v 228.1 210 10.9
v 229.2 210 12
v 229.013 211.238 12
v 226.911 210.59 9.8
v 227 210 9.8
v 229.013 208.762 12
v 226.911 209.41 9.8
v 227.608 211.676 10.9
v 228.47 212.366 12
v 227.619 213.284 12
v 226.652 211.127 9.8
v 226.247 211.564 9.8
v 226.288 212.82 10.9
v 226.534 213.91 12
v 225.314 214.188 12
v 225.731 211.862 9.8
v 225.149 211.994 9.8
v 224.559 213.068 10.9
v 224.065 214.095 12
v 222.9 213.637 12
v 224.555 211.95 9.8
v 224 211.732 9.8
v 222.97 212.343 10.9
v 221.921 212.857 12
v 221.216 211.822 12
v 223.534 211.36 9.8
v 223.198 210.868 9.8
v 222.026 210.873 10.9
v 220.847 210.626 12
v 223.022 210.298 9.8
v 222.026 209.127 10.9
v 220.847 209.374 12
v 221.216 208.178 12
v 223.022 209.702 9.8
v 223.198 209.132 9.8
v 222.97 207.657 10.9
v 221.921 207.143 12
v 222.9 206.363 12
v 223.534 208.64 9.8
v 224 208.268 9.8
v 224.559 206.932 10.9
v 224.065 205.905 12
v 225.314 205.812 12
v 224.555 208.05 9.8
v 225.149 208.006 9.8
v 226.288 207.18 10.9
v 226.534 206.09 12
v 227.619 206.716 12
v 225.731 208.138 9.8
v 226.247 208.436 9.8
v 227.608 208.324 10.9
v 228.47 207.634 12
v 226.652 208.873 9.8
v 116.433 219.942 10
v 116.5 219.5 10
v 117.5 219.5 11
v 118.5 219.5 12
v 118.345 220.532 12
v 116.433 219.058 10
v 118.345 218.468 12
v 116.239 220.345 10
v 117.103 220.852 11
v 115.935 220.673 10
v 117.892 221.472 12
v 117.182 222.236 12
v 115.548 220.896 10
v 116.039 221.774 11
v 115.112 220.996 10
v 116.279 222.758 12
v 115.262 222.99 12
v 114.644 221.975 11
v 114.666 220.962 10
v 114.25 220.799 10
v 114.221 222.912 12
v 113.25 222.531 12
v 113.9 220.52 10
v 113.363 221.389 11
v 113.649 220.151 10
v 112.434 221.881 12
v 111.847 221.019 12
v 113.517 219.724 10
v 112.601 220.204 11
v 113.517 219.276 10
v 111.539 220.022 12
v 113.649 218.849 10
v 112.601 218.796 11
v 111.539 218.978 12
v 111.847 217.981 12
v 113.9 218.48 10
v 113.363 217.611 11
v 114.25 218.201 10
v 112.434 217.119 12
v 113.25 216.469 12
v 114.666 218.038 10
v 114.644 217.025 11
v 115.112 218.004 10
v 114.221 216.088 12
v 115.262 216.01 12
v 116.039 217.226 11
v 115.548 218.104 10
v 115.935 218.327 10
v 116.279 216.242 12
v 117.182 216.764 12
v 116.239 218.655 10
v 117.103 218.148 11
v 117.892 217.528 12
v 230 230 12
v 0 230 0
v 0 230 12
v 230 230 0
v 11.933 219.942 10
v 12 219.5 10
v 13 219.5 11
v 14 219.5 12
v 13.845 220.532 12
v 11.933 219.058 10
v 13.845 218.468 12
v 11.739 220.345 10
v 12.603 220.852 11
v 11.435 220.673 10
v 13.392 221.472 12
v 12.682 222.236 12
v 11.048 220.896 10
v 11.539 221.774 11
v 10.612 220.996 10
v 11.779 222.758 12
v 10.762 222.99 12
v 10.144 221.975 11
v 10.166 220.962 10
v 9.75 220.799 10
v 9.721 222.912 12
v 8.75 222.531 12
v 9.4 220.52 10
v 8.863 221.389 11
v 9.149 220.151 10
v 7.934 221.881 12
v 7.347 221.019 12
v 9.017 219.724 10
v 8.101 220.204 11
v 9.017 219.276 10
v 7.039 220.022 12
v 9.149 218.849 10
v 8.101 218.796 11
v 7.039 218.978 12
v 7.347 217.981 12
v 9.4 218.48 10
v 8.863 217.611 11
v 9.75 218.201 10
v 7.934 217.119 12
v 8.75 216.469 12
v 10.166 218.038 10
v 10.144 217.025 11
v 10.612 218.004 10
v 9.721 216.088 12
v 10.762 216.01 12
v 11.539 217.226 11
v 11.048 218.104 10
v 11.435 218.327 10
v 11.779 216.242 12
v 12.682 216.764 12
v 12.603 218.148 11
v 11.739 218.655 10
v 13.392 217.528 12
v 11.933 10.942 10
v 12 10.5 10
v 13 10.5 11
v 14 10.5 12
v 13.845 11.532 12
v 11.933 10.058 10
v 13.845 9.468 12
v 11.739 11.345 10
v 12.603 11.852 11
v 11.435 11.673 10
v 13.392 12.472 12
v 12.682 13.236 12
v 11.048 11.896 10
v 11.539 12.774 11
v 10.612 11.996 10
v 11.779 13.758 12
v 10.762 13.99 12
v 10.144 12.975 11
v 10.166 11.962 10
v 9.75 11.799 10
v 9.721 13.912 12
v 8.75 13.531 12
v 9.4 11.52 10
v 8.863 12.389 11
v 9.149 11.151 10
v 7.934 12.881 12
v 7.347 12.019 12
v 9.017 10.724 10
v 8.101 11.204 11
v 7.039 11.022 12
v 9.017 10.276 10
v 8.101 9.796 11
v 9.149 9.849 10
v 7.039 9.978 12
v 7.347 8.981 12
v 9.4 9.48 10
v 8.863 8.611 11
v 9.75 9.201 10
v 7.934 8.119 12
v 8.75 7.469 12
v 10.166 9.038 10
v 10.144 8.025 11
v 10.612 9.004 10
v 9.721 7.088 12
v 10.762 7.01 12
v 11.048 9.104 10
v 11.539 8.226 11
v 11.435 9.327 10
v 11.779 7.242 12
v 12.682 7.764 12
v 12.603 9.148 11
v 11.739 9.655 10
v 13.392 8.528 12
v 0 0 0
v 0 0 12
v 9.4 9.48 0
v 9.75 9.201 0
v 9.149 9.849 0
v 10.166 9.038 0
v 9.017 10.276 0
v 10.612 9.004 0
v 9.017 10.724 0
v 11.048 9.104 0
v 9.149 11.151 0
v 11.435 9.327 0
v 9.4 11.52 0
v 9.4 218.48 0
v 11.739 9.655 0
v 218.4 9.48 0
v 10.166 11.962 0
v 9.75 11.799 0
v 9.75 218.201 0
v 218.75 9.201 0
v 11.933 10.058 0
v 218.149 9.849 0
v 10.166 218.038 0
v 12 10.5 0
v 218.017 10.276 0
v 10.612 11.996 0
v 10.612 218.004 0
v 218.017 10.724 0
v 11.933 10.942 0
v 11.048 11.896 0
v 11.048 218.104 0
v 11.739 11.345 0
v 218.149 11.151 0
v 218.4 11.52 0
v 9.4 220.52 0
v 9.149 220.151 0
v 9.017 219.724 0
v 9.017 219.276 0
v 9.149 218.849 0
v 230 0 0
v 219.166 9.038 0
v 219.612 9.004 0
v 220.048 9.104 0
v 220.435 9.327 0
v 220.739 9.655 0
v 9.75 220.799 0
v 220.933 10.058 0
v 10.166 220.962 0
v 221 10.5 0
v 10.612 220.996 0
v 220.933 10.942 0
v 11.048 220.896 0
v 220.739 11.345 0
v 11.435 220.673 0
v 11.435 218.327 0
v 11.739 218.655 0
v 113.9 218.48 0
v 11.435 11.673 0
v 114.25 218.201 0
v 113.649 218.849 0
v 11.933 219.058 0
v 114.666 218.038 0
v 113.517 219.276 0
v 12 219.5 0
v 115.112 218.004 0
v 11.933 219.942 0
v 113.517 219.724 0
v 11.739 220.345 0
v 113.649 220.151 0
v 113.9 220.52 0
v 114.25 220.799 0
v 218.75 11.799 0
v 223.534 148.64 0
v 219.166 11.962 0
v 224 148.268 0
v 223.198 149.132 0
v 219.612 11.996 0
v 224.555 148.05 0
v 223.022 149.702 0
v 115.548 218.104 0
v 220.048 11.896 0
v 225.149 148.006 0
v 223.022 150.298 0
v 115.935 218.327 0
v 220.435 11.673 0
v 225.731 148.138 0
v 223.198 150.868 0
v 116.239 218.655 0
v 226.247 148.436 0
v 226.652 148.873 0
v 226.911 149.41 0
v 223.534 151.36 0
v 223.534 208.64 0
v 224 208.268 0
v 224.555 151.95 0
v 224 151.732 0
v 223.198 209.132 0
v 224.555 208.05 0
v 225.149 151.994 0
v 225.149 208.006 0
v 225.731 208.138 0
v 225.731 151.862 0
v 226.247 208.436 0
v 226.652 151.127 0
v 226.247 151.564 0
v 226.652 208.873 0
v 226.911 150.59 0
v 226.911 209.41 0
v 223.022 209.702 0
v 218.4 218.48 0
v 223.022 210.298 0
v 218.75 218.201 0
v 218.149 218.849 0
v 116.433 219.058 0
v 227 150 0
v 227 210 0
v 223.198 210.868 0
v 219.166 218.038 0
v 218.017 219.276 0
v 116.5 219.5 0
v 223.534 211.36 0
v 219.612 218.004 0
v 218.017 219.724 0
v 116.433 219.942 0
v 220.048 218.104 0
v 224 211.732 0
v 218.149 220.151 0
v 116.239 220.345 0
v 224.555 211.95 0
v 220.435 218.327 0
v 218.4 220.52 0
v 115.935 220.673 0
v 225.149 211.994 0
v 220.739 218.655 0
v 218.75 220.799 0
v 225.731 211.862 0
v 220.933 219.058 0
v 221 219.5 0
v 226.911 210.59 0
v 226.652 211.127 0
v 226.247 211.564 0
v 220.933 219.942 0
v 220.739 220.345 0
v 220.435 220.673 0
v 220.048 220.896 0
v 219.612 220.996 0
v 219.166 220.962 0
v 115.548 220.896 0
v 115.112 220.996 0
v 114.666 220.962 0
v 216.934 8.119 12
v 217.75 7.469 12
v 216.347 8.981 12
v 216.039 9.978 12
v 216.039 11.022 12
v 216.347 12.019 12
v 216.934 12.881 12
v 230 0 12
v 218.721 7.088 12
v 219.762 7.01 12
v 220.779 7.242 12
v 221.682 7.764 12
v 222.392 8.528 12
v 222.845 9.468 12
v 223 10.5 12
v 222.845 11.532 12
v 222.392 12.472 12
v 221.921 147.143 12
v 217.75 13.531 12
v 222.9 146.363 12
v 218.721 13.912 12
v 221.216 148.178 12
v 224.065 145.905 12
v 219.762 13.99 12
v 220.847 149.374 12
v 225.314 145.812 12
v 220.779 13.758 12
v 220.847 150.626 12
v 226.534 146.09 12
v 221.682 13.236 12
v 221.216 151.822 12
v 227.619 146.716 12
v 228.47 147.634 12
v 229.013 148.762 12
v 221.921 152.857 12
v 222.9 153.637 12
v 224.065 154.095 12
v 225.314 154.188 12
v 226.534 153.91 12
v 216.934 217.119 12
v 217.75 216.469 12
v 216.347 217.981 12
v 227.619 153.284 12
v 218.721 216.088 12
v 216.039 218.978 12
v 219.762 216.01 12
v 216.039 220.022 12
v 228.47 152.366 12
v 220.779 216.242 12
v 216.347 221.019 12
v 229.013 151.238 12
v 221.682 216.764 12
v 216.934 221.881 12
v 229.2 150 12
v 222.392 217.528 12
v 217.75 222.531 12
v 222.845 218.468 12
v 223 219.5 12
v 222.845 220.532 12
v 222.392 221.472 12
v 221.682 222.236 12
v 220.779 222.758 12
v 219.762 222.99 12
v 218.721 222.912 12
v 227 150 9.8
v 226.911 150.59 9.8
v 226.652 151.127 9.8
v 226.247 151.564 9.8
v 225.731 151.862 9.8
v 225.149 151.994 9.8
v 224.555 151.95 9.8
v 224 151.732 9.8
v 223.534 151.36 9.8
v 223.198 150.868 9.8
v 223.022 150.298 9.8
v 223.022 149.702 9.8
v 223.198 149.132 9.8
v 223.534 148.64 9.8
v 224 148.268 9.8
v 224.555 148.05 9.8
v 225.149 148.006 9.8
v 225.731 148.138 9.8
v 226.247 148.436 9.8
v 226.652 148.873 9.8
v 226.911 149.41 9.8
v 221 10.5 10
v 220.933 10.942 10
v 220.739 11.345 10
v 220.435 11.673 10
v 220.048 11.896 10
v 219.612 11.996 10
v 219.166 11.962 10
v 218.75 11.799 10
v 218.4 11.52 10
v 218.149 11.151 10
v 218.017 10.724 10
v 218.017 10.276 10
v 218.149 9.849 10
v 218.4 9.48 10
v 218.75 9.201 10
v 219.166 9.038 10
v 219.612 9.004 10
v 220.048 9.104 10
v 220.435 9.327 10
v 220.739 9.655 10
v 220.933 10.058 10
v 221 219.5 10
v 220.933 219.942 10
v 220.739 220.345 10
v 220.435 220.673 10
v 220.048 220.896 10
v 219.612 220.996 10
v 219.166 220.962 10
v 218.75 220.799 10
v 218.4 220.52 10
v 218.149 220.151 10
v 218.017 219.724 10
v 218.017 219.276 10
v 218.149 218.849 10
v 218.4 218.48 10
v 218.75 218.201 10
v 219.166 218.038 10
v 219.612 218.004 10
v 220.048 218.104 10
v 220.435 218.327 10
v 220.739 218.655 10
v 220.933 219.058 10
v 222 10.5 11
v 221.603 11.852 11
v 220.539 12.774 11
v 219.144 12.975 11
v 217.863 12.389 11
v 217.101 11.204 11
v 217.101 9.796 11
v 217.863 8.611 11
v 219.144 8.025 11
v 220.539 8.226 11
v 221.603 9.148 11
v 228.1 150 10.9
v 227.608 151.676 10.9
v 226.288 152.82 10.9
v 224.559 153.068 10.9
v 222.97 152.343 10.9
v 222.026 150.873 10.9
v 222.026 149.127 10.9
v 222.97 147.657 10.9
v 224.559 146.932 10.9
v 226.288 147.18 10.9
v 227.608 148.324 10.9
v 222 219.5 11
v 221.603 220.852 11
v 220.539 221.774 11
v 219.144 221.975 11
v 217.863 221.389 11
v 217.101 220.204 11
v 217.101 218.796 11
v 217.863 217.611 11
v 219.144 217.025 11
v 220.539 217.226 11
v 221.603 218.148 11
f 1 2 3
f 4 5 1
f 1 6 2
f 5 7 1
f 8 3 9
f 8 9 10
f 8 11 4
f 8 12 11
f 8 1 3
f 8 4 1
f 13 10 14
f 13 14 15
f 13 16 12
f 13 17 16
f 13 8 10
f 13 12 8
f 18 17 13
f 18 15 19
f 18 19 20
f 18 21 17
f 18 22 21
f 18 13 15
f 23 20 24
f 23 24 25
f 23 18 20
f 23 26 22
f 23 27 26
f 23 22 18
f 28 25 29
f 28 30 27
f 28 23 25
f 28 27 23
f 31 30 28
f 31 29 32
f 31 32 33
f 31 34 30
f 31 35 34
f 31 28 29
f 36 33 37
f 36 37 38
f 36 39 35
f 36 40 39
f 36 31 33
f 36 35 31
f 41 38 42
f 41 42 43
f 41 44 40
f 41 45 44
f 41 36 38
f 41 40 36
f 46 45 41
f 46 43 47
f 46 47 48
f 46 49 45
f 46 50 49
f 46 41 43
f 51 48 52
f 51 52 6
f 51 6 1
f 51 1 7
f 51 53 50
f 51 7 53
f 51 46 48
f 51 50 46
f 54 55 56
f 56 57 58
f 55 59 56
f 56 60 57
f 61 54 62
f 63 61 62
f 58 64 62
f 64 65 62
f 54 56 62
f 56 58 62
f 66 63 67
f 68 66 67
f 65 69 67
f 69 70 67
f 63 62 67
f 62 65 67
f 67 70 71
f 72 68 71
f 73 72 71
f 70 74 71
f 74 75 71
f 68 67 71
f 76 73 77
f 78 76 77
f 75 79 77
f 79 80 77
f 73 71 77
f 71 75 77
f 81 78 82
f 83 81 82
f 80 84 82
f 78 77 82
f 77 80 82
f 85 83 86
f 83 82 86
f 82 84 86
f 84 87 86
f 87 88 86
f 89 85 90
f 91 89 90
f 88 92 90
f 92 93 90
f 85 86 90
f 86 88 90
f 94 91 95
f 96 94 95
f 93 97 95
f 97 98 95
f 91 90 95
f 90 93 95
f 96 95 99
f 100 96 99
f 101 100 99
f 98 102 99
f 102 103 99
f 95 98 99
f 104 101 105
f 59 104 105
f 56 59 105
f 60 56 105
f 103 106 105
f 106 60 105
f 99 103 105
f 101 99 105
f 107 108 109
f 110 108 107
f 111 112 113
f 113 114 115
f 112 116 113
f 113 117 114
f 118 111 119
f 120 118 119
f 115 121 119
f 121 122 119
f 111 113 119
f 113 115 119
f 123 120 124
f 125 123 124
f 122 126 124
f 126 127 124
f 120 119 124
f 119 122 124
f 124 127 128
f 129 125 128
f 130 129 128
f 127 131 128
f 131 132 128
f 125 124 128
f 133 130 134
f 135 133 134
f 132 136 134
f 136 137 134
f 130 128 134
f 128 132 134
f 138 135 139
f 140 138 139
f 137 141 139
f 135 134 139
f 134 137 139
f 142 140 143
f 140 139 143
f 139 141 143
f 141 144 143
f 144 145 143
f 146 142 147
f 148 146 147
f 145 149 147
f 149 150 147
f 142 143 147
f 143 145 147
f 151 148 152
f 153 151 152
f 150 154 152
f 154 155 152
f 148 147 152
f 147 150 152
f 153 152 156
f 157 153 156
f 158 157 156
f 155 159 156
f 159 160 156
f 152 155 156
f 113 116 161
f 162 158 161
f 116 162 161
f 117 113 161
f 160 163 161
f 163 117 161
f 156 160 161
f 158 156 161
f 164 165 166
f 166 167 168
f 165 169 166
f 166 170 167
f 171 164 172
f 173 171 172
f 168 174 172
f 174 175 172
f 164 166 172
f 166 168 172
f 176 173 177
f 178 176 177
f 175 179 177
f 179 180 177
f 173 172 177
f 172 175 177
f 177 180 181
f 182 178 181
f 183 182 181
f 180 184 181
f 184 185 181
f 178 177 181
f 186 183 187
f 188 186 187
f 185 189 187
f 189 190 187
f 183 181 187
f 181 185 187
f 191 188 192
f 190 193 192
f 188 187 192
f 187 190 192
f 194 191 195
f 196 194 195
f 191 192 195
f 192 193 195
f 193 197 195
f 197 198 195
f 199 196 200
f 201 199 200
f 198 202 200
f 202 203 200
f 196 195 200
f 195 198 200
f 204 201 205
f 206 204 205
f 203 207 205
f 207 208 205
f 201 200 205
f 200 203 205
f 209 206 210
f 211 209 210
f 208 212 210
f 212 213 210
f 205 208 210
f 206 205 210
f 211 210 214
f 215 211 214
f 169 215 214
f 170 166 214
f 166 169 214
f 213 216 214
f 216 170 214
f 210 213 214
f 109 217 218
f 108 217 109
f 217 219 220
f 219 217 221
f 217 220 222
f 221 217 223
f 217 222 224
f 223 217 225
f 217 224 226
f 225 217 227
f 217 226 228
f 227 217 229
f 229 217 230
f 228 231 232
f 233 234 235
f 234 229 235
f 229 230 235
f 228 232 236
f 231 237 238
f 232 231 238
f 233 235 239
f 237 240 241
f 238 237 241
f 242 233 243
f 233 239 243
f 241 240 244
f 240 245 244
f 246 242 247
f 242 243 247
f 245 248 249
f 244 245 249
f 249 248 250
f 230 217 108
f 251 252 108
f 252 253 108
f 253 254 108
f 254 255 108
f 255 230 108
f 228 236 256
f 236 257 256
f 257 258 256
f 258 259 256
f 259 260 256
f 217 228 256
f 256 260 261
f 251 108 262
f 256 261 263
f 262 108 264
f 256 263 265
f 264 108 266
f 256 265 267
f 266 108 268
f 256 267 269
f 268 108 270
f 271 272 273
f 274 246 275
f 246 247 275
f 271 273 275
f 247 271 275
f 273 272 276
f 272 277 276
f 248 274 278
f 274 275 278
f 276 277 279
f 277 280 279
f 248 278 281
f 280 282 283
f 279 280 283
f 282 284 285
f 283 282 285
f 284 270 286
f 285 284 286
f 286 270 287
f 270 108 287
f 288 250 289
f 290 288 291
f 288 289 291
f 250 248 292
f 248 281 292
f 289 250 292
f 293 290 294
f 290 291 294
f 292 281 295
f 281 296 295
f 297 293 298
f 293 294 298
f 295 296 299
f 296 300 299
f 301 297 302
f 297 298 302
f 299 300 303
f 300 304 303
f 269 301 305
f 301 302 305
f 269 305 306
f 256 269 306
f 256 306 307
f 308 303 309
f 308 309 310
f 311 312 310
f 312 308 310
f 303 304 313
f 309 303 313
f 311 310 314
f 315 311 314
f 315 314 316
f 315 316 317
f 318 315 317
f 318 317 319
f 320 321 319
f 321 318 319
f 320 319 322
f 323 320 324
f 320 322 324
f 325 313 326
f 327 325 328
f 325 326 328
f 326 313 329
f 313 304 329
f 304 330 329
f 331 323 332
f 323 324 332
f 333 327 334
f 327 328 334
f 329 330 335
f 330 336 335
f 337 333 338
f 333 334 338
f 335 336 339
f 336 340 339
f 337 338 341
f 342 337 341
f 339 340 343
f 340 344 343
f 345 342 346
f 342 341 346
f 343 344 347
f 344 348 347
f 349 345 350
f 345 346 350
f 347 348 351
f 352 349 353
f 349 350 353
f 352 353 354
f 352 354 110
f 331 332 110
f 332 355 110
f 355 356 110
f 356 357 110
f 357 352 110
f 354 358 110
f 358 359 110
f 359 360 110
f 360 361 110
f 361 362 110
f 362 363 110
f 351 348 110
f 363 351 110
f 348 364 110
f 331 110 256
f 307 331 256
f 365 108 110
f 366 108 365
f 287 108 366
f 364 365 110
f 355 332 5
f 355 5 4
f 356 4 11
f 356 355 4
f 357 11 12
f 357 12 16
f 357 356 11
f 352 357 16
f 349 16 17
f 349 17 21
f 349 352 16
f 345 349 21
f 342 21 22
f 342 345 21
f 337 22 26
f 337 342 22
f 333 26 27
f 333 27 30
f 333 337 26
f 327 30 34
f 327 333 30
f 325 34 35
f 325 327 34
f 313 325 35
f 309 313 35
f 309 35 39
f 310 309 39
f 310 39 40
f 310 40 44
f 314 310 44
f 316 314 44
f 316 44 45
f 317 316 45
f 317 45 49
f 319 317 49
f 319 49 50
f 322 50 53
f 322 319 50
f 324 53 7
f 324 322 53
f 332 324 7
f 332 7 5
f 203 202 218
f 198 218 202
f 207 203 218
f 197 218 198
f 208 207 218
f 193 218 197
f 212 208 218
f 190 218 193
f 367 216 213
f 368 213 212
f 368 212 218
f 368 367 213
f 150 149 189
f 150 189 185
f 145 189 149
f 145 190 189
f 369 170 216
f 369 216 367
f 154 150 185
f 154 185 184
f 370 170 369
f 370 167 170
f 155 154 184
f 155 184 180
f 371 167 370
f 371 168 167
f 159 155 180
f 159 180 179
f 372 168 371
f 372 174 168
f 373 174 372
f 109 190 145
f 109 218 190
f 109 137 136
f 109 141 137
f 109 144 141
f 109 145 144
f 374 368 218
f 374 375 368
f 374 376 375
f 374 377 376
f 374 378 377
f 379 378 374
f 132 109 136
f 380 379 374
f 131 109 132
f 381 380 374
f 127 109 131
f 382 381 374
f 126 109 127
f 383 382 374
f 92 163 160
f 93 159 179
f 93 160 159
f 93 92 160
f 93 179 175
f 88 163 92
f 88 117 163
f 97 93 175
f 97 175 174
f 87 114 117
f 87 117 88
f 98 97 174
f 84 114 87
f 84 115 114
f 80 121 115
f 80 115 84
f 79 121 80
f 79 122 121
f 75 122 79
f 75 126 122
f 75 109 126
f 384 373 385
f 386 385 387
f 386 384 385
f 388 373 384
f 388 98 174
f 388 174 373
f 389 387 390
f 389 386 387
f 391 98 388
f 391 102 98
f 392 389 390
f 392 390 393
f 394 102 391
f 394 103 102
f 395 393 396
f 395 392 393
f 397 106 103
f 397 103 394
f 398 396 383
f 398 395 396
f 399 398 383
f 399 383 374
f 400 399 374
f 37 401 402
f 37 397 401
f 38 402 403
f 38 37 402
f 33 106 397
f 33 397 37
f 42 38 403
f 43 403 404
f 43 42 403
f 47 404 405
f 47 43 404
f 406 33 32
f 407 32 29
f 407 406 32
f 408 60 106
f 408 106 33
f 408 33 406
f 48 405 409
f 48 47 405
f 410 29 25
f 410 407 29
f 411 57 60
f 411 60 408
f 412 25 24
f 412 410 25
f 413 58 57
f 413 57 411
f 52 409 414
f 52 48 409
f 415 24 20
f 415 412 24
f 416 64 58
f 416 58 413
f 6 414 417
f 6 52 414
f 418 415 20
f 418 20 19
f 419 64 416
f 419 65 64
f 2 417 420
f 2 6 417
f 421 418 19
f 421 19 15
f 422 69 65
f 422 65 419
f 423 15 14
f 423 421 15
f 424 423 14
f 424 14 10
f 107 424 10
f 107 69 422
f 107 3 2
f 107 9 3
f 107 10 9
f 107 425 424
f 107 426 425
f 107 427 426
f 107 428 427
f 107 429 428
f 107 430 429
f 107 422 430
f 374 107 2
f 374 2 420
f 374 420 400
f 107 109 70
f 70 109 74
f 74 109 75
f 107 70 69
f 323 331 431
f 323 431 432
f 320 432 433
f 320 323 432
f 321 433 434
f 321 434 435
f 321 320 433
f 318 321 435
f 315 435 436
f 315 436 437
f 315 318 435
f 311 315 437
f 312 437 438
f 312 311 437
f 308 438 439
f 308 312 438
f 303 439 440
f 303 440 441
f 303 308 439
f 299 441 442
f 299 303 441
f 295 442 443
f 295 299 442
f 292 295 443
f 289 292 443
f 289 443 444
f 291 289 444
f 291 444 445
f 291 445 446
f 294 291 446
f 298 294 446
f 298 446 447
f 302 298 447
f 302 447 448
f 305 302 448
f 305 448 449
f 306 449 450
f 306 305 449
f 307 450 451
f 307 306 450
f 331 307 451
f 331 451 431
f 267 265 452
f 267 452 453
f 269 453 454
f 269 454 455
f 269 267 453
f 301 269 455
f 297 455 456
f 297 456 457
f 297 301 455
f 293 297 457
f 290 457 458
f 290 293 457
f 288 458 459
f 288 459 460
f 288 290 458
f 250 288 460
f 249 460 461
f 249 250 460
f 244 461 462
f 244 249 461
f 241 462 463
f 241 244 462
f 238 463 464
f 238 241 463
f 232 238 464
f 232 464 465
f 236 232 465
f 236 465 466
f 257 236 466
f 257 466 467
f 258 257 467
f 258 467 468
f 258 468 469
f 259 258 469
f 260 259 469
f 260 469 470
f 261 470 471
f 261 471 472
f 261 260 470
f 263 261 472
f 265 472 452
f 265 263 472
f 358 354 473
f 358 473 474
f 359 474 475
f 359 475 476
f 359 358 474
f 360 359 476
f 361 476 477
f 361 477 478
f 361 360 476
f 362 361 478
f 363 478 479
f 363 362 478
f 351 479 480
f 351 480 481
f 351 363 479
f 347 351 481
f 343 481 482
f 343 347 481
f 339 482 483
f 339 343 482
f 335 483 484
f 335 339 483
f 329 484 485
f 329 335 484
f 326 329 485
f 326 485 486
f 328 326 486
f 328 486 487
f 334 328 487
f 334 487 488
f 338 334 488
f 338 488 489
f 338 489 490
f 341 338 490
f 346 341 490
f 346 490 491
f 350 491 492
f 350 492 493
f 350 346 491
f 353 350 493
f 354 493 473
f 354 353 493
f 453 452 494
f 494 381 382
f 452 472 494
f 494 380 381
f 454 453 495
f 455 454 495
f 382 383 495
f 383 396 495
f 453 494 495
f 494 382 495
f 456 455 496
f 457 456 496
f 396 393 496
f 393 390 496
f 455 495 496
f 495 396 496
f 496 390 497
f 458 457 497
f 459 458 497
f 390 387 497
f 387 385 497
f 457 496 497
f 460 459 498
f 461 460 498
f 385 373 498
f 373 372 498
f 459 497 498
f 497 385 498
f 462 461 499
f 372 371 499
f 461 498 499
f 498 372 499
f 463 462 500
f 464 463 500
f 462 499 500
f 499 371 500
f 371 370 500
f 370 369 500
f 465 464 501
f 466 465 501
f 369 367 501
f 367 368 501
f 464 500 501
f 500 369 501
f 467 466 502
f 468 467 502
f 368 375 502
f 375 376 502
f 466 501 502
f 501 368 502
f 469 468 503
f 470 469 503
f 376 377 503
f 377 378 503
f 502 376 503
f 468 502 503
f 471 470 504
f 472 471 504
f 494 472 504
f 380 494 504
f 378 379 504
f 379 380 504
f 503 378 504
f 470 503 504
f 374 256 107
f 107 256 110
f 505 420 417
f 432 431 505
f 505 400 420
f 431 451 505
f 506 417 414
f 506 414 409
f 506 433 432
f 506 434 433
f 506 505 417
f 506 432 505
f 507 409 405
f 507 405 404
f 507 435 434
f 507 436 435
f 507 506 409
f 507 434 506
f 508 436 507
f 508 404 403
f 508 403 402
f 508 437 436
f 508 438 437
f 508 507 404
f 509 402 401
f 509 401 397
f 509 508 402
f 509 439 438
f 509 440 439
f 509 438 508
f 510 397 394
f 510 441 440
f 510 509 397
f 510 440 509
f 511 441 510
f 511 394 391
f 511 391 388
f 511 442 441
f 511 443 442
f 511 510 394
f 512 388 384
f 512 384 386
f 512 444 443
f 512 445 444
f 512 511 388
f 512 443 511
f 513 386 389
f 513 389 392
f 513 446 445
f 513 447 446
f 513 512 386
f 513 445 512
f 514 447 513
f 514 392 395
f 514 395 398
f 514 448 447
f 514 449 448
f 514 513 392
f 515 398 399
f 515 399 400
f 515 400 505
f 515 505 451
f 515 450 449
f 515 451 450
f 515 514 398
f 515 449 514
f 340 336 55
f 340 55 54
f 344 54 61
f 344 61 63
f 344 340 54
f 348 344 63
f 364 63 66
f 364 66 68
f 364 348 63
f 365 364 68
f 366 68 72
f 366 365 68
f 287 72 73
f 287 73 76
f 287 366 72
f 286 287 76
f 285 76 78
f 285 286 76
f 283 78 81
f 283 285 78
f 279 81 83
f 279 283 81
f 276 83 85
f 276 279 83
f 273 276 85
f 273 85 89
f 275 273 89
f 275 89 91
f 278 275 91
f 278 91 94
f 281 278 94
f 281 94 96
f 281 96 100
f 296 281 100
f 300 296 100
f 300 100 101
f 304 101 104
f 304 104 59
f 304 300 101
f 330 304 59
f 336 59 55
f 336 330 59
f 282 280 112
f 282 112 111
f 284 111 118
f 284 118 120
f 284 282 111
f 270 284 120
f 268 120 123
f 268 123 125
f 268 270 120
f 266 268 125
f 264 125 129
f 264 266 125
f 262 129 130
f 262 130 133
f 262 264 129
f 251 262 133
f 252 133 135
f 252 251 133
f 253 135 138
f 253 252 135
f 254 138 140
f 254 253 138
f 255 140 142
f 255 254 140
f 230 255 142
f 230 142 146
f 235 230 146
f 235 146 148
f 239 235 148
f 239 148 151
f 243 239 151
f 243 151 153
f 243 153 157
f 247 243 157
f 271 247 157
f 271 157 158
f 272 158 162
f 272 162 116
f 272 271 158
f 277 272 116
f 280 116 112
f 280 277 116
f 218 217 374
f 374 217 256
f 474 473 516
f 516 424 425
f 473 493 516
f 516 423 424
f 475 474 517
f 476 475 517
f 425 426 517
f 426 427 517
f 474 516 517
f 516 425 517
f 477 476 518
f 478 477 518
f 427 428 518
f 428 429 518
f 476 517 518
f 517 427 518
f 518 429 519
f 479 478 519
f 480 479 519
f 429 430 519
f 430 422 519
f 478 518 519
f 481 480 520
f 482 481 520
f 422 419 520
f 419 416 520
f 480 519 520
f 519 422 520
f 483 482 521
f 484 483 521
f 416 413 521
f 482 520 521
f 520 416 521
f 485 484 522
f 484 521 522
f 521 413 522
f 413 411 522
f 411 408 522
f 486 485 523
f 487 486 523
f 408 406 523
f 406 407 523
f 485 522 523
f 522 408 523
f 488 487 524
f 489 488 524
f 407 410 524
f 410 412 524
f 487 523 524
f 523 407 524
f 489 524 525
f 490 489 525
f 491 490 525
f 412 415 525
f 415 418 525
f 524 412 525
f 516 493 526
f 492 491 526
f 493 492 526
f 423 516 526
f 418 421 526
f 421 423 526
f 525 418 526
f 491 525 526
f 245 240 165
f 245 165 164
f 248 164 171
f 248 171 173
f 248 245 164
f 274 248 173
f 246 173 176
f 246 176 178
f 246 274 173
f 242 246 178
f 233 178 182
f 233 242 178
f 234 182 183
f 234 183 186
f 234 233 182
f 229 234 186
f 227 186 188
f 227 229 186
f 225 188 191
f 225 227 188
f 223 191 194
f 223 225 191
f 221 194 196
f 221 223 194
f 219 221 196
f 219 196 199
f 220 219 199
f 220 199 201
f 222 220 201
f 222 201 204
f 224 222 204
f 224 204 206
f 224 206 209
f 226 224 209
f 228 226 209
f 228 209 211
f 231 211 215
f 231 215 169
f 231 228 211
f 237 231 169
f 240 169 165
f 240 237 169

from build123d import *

# Parameters (mm, degrees)
SKETCH_1_W      = 230
SKETCH_1_H      = 230
SKETCH_1_R      = 1.5
SKETCH_1_R_2    = 2
EXTRUDE_1_DEPTH = 12
CHAMFER_1_SIZE  = 2
CHAMFER_2_SIZE  = 2.2


with BuildPart() as part:
    # Эскиз1 → Бобышка-Вытянуть1 (new body)
    with BuildSketch(Plane.XY):
        with Locations((115, 115)):
            Rectangle(SKETCH_1_W, SKETCH_1_H)
        with Locations((219.5, 10.5)):
            Circle(SKETCH_1_R, mode=Mode.SUBTRACT)
        with Locations((219.5, 219.5)):
            Circle(SKETCH_1_R, mode=Mode.SUBTRACT)
        with Locations((10.5, 219.5)):
            Circle(SKETCH_1_R, mode=Mode.SUBTRACT)
        with Locations((10.5, 10.5)):
            Circle(SKETCH_1_R, mode=Mode.SUBTRACT)
        with Locations((115, 219.5)):
            Circle(SKETCH_1_R, mode=Mode.SUBTRACT)
        with Locations((225, 150)):
            Circle(SKETCH_1_R_2, mode=Mode.SUBTRACT)
        with Locations((225, 210)):
            Circle(SKETCH_1_R_2, mode=Mode.SUBTRACT)
    extrude(amount=EXTRUDE_1_DEPTH)

    # Фаска1
    chamfer_1_edges = [part.edges().sort_by_distance(p)[0] for p in [
        (218, 10.5, 12),
        (218, 219.5, 12),
        (9, 219.5, 12),
        (9, 10.5, 12),
        (113.5, 219.5, 12),
    ]]
    chamfer(chamfer_1_edges, length=CHAMFER_1_SIZE)

    # Фаска2
    chamfer_2_edges = [part.edges().sort_by_distance(p)[0] for p in [
        (223, 150, 12),
        (223, 210, 12),
    ]]
    chamfer(chamfer_2_edges, length=CHAMFER_2_SIZE)


solid = part.part
